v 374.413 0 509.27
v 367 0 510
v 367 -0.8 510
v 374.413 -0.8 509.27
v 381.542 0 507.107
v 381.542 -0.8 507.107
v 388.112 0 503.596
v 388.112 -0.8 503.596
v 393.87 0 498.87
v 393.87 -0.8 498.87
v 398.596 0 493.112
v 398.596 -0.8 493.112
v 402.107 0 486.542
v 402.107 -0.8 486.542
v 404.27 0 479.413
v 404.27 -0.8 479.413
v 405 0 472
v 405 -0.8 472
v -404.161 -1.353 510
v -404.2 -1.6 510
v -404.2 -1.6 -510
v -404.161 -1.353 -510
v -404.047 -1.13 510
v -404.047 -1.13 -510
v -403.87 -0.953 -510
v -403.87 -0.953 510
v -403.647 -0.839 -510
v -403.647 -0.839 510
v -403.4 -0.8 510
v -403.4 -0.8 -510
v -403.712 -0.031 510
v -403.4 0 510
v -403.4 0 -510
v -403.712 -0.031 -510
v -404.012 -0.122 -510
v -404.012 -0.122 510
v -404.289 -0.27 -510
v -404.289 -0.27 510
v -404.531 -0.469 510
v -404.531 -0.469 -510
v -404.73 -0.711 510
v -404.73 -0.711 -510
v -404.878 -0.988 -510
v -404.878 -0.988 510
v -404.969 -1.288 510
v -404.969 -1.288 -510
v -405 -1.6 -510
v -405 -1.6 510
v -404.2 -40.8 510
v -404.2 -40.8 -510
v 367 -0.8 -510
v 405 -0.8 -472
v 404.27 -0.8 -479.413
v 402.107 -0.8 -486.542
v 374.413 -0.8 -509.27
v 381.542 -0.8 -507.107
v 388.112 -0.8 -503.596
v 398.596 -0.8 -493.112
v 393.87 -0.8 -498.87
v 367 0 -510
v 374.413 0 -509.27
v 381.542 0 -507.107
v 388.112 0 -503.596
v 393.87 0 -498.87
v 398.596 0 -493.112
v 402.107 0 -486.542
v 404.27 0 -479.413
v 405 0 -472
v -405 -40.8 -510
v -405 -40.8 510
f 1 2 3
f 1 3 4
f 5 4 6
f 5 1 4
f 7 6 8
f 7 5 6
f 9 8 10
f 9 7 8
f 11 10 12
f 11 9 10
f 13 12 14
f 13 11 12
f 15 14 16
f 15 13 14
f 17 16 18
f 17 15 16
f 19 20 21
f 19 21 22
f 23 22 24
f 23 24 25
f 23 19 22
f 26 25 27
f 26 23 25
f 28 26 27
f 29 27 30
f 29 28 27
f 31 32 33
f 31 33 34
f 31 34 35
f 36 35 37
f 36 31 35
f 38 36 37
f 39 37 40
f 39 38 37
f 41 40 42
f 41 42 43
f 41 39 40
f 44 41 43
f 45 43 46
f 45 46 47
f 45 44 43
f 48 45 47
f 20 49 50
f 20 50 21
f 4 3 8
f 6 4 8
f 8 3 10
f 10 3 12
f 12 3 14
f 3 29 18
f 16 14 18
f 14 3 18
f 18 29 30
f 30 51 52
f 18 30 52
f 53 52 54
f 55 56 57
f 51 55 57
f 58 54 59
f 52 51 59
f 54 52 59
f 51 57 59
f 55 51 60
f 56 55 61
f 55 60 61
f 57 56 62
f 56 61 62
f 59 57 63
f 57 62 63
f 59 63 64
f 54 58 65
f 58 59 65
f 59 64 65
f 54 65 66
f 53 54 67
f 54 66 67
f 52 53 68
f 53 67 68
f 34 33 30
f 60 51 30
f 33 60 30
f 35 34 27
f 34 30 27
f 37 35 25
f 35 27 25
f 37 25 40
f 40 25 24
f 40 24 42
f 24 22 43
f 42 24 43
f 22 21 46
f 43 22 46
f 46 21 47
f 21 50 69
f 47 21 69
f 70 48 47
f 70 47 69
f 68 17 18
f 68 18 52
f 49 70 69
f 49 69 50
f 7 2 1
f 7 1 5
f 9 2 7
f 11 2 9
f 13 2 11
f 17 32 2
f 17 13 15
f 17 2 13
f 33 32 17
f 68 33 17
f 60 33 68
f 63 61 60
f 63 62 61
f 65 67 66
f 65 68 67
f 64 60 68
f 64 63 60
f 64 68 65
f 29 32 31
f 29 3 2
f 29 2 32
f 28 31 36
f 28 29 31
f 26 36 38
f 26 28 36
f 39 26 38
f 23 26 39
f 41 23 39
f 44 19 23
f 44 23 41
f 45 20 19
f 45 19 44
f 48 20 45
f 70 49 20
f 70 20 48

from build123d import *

# Parameters (mm, degrees)
SKETCH1_W                    = 810
SKETCH1_H                    = 1020
BASE_FLANGE1_DEPTH           = 0.8
EDGE_FLANGE1_STRIP_W         = 4.8
EDGE_FLANGE1_STRIP_H         = 0.8
EDGE_FLANGE1_STRIP_CUT_DEPTH = 1020
EDGE_FLANGE1_DEPTH           = 1020
CUT_EXTRUDE2_DEPTH           = 10


# Sheet-metal steps are written as plain solids
with BuildPart() as part:
    # Sketch1 → Base-Flange1 (new body)
    with BuildSketch(Plane(origin=(0, 0, 0), x_dir=(1, 0, 0), z_dir=(0, 1, 0))):
        Rectangle(SKETCH1_W, SKETCH1_H)
    extrude(amount=-BASE_FLANGE1_DEPTH)

    # Edge-Flange1 strip (across the edge) → Edge-Flange1 strip cut (cut)
    with BuildSketch(Plane(origin=(-405, -0.8, 510), x_dir=(1, 0, 0), z_dir=(0, 0, -1))):
        with Locations((-0.8, -0.4)):
            Rectangle(EDGE_FLANGE1_STRIP_W, EDGE_FLANGE1_STRIP_H)
    extrude(amount=EDGE_FLANGE1_STRIP_CUT_DEPTH, mode=Mode.SUBTRACT)

    # Edge-Flange1 section (across the edge) → Edge-Flange1 (add)
    with BuildSketch(Plane(origin=(-405, -0.8, 510), x_dir=(1, 0, 0), z_dir=(0, 0, -1))):
        with BuildLine():
            Line((0, 0.8), (0, 40))
            Line((0, 40), (0.8, 40))
            Line((0.8, 40), (0.8, 0.8))
            ThreePointArc((0.8, 0.8), (1.034314575, 0.234314575), (1.6, 0))
            Line((1.6, 0), (1.6, -0.8))
            ThreePointArc((1.6, -0.8), (0.46862915, -0.33137085), (0, 0.8))
        make_face()
    extrude(amount=EDGE_FLANGE1_DEPTH)

    # Sketch7 → Cut-Extrude2 (cut)
    with BuildSketch(Plane(origin=(0, 0, 0), x_dir=(1, 0, 0), z_dir=(0, 1, 0))):
        with BuildLine():
            Line((405, 510), (367, 510))
            ThreePointArc((367, 510), (393.870057685, 498.870057685), (405, 472))
            Line((405, 472), (405, 510))
        make_face()
        with BuildLine():
            Line((405, -510), (367, -510))
            ThreePointArc((367, -510), (393.870057685, -498.870057685), (405, -472))
            Line((405, -472), (405, -510))
        make_face()
    extrude(amount=-CUT_EXTRUDE2_DEPTH, mode=Mode.SUBTRACT)


solid = part.part
